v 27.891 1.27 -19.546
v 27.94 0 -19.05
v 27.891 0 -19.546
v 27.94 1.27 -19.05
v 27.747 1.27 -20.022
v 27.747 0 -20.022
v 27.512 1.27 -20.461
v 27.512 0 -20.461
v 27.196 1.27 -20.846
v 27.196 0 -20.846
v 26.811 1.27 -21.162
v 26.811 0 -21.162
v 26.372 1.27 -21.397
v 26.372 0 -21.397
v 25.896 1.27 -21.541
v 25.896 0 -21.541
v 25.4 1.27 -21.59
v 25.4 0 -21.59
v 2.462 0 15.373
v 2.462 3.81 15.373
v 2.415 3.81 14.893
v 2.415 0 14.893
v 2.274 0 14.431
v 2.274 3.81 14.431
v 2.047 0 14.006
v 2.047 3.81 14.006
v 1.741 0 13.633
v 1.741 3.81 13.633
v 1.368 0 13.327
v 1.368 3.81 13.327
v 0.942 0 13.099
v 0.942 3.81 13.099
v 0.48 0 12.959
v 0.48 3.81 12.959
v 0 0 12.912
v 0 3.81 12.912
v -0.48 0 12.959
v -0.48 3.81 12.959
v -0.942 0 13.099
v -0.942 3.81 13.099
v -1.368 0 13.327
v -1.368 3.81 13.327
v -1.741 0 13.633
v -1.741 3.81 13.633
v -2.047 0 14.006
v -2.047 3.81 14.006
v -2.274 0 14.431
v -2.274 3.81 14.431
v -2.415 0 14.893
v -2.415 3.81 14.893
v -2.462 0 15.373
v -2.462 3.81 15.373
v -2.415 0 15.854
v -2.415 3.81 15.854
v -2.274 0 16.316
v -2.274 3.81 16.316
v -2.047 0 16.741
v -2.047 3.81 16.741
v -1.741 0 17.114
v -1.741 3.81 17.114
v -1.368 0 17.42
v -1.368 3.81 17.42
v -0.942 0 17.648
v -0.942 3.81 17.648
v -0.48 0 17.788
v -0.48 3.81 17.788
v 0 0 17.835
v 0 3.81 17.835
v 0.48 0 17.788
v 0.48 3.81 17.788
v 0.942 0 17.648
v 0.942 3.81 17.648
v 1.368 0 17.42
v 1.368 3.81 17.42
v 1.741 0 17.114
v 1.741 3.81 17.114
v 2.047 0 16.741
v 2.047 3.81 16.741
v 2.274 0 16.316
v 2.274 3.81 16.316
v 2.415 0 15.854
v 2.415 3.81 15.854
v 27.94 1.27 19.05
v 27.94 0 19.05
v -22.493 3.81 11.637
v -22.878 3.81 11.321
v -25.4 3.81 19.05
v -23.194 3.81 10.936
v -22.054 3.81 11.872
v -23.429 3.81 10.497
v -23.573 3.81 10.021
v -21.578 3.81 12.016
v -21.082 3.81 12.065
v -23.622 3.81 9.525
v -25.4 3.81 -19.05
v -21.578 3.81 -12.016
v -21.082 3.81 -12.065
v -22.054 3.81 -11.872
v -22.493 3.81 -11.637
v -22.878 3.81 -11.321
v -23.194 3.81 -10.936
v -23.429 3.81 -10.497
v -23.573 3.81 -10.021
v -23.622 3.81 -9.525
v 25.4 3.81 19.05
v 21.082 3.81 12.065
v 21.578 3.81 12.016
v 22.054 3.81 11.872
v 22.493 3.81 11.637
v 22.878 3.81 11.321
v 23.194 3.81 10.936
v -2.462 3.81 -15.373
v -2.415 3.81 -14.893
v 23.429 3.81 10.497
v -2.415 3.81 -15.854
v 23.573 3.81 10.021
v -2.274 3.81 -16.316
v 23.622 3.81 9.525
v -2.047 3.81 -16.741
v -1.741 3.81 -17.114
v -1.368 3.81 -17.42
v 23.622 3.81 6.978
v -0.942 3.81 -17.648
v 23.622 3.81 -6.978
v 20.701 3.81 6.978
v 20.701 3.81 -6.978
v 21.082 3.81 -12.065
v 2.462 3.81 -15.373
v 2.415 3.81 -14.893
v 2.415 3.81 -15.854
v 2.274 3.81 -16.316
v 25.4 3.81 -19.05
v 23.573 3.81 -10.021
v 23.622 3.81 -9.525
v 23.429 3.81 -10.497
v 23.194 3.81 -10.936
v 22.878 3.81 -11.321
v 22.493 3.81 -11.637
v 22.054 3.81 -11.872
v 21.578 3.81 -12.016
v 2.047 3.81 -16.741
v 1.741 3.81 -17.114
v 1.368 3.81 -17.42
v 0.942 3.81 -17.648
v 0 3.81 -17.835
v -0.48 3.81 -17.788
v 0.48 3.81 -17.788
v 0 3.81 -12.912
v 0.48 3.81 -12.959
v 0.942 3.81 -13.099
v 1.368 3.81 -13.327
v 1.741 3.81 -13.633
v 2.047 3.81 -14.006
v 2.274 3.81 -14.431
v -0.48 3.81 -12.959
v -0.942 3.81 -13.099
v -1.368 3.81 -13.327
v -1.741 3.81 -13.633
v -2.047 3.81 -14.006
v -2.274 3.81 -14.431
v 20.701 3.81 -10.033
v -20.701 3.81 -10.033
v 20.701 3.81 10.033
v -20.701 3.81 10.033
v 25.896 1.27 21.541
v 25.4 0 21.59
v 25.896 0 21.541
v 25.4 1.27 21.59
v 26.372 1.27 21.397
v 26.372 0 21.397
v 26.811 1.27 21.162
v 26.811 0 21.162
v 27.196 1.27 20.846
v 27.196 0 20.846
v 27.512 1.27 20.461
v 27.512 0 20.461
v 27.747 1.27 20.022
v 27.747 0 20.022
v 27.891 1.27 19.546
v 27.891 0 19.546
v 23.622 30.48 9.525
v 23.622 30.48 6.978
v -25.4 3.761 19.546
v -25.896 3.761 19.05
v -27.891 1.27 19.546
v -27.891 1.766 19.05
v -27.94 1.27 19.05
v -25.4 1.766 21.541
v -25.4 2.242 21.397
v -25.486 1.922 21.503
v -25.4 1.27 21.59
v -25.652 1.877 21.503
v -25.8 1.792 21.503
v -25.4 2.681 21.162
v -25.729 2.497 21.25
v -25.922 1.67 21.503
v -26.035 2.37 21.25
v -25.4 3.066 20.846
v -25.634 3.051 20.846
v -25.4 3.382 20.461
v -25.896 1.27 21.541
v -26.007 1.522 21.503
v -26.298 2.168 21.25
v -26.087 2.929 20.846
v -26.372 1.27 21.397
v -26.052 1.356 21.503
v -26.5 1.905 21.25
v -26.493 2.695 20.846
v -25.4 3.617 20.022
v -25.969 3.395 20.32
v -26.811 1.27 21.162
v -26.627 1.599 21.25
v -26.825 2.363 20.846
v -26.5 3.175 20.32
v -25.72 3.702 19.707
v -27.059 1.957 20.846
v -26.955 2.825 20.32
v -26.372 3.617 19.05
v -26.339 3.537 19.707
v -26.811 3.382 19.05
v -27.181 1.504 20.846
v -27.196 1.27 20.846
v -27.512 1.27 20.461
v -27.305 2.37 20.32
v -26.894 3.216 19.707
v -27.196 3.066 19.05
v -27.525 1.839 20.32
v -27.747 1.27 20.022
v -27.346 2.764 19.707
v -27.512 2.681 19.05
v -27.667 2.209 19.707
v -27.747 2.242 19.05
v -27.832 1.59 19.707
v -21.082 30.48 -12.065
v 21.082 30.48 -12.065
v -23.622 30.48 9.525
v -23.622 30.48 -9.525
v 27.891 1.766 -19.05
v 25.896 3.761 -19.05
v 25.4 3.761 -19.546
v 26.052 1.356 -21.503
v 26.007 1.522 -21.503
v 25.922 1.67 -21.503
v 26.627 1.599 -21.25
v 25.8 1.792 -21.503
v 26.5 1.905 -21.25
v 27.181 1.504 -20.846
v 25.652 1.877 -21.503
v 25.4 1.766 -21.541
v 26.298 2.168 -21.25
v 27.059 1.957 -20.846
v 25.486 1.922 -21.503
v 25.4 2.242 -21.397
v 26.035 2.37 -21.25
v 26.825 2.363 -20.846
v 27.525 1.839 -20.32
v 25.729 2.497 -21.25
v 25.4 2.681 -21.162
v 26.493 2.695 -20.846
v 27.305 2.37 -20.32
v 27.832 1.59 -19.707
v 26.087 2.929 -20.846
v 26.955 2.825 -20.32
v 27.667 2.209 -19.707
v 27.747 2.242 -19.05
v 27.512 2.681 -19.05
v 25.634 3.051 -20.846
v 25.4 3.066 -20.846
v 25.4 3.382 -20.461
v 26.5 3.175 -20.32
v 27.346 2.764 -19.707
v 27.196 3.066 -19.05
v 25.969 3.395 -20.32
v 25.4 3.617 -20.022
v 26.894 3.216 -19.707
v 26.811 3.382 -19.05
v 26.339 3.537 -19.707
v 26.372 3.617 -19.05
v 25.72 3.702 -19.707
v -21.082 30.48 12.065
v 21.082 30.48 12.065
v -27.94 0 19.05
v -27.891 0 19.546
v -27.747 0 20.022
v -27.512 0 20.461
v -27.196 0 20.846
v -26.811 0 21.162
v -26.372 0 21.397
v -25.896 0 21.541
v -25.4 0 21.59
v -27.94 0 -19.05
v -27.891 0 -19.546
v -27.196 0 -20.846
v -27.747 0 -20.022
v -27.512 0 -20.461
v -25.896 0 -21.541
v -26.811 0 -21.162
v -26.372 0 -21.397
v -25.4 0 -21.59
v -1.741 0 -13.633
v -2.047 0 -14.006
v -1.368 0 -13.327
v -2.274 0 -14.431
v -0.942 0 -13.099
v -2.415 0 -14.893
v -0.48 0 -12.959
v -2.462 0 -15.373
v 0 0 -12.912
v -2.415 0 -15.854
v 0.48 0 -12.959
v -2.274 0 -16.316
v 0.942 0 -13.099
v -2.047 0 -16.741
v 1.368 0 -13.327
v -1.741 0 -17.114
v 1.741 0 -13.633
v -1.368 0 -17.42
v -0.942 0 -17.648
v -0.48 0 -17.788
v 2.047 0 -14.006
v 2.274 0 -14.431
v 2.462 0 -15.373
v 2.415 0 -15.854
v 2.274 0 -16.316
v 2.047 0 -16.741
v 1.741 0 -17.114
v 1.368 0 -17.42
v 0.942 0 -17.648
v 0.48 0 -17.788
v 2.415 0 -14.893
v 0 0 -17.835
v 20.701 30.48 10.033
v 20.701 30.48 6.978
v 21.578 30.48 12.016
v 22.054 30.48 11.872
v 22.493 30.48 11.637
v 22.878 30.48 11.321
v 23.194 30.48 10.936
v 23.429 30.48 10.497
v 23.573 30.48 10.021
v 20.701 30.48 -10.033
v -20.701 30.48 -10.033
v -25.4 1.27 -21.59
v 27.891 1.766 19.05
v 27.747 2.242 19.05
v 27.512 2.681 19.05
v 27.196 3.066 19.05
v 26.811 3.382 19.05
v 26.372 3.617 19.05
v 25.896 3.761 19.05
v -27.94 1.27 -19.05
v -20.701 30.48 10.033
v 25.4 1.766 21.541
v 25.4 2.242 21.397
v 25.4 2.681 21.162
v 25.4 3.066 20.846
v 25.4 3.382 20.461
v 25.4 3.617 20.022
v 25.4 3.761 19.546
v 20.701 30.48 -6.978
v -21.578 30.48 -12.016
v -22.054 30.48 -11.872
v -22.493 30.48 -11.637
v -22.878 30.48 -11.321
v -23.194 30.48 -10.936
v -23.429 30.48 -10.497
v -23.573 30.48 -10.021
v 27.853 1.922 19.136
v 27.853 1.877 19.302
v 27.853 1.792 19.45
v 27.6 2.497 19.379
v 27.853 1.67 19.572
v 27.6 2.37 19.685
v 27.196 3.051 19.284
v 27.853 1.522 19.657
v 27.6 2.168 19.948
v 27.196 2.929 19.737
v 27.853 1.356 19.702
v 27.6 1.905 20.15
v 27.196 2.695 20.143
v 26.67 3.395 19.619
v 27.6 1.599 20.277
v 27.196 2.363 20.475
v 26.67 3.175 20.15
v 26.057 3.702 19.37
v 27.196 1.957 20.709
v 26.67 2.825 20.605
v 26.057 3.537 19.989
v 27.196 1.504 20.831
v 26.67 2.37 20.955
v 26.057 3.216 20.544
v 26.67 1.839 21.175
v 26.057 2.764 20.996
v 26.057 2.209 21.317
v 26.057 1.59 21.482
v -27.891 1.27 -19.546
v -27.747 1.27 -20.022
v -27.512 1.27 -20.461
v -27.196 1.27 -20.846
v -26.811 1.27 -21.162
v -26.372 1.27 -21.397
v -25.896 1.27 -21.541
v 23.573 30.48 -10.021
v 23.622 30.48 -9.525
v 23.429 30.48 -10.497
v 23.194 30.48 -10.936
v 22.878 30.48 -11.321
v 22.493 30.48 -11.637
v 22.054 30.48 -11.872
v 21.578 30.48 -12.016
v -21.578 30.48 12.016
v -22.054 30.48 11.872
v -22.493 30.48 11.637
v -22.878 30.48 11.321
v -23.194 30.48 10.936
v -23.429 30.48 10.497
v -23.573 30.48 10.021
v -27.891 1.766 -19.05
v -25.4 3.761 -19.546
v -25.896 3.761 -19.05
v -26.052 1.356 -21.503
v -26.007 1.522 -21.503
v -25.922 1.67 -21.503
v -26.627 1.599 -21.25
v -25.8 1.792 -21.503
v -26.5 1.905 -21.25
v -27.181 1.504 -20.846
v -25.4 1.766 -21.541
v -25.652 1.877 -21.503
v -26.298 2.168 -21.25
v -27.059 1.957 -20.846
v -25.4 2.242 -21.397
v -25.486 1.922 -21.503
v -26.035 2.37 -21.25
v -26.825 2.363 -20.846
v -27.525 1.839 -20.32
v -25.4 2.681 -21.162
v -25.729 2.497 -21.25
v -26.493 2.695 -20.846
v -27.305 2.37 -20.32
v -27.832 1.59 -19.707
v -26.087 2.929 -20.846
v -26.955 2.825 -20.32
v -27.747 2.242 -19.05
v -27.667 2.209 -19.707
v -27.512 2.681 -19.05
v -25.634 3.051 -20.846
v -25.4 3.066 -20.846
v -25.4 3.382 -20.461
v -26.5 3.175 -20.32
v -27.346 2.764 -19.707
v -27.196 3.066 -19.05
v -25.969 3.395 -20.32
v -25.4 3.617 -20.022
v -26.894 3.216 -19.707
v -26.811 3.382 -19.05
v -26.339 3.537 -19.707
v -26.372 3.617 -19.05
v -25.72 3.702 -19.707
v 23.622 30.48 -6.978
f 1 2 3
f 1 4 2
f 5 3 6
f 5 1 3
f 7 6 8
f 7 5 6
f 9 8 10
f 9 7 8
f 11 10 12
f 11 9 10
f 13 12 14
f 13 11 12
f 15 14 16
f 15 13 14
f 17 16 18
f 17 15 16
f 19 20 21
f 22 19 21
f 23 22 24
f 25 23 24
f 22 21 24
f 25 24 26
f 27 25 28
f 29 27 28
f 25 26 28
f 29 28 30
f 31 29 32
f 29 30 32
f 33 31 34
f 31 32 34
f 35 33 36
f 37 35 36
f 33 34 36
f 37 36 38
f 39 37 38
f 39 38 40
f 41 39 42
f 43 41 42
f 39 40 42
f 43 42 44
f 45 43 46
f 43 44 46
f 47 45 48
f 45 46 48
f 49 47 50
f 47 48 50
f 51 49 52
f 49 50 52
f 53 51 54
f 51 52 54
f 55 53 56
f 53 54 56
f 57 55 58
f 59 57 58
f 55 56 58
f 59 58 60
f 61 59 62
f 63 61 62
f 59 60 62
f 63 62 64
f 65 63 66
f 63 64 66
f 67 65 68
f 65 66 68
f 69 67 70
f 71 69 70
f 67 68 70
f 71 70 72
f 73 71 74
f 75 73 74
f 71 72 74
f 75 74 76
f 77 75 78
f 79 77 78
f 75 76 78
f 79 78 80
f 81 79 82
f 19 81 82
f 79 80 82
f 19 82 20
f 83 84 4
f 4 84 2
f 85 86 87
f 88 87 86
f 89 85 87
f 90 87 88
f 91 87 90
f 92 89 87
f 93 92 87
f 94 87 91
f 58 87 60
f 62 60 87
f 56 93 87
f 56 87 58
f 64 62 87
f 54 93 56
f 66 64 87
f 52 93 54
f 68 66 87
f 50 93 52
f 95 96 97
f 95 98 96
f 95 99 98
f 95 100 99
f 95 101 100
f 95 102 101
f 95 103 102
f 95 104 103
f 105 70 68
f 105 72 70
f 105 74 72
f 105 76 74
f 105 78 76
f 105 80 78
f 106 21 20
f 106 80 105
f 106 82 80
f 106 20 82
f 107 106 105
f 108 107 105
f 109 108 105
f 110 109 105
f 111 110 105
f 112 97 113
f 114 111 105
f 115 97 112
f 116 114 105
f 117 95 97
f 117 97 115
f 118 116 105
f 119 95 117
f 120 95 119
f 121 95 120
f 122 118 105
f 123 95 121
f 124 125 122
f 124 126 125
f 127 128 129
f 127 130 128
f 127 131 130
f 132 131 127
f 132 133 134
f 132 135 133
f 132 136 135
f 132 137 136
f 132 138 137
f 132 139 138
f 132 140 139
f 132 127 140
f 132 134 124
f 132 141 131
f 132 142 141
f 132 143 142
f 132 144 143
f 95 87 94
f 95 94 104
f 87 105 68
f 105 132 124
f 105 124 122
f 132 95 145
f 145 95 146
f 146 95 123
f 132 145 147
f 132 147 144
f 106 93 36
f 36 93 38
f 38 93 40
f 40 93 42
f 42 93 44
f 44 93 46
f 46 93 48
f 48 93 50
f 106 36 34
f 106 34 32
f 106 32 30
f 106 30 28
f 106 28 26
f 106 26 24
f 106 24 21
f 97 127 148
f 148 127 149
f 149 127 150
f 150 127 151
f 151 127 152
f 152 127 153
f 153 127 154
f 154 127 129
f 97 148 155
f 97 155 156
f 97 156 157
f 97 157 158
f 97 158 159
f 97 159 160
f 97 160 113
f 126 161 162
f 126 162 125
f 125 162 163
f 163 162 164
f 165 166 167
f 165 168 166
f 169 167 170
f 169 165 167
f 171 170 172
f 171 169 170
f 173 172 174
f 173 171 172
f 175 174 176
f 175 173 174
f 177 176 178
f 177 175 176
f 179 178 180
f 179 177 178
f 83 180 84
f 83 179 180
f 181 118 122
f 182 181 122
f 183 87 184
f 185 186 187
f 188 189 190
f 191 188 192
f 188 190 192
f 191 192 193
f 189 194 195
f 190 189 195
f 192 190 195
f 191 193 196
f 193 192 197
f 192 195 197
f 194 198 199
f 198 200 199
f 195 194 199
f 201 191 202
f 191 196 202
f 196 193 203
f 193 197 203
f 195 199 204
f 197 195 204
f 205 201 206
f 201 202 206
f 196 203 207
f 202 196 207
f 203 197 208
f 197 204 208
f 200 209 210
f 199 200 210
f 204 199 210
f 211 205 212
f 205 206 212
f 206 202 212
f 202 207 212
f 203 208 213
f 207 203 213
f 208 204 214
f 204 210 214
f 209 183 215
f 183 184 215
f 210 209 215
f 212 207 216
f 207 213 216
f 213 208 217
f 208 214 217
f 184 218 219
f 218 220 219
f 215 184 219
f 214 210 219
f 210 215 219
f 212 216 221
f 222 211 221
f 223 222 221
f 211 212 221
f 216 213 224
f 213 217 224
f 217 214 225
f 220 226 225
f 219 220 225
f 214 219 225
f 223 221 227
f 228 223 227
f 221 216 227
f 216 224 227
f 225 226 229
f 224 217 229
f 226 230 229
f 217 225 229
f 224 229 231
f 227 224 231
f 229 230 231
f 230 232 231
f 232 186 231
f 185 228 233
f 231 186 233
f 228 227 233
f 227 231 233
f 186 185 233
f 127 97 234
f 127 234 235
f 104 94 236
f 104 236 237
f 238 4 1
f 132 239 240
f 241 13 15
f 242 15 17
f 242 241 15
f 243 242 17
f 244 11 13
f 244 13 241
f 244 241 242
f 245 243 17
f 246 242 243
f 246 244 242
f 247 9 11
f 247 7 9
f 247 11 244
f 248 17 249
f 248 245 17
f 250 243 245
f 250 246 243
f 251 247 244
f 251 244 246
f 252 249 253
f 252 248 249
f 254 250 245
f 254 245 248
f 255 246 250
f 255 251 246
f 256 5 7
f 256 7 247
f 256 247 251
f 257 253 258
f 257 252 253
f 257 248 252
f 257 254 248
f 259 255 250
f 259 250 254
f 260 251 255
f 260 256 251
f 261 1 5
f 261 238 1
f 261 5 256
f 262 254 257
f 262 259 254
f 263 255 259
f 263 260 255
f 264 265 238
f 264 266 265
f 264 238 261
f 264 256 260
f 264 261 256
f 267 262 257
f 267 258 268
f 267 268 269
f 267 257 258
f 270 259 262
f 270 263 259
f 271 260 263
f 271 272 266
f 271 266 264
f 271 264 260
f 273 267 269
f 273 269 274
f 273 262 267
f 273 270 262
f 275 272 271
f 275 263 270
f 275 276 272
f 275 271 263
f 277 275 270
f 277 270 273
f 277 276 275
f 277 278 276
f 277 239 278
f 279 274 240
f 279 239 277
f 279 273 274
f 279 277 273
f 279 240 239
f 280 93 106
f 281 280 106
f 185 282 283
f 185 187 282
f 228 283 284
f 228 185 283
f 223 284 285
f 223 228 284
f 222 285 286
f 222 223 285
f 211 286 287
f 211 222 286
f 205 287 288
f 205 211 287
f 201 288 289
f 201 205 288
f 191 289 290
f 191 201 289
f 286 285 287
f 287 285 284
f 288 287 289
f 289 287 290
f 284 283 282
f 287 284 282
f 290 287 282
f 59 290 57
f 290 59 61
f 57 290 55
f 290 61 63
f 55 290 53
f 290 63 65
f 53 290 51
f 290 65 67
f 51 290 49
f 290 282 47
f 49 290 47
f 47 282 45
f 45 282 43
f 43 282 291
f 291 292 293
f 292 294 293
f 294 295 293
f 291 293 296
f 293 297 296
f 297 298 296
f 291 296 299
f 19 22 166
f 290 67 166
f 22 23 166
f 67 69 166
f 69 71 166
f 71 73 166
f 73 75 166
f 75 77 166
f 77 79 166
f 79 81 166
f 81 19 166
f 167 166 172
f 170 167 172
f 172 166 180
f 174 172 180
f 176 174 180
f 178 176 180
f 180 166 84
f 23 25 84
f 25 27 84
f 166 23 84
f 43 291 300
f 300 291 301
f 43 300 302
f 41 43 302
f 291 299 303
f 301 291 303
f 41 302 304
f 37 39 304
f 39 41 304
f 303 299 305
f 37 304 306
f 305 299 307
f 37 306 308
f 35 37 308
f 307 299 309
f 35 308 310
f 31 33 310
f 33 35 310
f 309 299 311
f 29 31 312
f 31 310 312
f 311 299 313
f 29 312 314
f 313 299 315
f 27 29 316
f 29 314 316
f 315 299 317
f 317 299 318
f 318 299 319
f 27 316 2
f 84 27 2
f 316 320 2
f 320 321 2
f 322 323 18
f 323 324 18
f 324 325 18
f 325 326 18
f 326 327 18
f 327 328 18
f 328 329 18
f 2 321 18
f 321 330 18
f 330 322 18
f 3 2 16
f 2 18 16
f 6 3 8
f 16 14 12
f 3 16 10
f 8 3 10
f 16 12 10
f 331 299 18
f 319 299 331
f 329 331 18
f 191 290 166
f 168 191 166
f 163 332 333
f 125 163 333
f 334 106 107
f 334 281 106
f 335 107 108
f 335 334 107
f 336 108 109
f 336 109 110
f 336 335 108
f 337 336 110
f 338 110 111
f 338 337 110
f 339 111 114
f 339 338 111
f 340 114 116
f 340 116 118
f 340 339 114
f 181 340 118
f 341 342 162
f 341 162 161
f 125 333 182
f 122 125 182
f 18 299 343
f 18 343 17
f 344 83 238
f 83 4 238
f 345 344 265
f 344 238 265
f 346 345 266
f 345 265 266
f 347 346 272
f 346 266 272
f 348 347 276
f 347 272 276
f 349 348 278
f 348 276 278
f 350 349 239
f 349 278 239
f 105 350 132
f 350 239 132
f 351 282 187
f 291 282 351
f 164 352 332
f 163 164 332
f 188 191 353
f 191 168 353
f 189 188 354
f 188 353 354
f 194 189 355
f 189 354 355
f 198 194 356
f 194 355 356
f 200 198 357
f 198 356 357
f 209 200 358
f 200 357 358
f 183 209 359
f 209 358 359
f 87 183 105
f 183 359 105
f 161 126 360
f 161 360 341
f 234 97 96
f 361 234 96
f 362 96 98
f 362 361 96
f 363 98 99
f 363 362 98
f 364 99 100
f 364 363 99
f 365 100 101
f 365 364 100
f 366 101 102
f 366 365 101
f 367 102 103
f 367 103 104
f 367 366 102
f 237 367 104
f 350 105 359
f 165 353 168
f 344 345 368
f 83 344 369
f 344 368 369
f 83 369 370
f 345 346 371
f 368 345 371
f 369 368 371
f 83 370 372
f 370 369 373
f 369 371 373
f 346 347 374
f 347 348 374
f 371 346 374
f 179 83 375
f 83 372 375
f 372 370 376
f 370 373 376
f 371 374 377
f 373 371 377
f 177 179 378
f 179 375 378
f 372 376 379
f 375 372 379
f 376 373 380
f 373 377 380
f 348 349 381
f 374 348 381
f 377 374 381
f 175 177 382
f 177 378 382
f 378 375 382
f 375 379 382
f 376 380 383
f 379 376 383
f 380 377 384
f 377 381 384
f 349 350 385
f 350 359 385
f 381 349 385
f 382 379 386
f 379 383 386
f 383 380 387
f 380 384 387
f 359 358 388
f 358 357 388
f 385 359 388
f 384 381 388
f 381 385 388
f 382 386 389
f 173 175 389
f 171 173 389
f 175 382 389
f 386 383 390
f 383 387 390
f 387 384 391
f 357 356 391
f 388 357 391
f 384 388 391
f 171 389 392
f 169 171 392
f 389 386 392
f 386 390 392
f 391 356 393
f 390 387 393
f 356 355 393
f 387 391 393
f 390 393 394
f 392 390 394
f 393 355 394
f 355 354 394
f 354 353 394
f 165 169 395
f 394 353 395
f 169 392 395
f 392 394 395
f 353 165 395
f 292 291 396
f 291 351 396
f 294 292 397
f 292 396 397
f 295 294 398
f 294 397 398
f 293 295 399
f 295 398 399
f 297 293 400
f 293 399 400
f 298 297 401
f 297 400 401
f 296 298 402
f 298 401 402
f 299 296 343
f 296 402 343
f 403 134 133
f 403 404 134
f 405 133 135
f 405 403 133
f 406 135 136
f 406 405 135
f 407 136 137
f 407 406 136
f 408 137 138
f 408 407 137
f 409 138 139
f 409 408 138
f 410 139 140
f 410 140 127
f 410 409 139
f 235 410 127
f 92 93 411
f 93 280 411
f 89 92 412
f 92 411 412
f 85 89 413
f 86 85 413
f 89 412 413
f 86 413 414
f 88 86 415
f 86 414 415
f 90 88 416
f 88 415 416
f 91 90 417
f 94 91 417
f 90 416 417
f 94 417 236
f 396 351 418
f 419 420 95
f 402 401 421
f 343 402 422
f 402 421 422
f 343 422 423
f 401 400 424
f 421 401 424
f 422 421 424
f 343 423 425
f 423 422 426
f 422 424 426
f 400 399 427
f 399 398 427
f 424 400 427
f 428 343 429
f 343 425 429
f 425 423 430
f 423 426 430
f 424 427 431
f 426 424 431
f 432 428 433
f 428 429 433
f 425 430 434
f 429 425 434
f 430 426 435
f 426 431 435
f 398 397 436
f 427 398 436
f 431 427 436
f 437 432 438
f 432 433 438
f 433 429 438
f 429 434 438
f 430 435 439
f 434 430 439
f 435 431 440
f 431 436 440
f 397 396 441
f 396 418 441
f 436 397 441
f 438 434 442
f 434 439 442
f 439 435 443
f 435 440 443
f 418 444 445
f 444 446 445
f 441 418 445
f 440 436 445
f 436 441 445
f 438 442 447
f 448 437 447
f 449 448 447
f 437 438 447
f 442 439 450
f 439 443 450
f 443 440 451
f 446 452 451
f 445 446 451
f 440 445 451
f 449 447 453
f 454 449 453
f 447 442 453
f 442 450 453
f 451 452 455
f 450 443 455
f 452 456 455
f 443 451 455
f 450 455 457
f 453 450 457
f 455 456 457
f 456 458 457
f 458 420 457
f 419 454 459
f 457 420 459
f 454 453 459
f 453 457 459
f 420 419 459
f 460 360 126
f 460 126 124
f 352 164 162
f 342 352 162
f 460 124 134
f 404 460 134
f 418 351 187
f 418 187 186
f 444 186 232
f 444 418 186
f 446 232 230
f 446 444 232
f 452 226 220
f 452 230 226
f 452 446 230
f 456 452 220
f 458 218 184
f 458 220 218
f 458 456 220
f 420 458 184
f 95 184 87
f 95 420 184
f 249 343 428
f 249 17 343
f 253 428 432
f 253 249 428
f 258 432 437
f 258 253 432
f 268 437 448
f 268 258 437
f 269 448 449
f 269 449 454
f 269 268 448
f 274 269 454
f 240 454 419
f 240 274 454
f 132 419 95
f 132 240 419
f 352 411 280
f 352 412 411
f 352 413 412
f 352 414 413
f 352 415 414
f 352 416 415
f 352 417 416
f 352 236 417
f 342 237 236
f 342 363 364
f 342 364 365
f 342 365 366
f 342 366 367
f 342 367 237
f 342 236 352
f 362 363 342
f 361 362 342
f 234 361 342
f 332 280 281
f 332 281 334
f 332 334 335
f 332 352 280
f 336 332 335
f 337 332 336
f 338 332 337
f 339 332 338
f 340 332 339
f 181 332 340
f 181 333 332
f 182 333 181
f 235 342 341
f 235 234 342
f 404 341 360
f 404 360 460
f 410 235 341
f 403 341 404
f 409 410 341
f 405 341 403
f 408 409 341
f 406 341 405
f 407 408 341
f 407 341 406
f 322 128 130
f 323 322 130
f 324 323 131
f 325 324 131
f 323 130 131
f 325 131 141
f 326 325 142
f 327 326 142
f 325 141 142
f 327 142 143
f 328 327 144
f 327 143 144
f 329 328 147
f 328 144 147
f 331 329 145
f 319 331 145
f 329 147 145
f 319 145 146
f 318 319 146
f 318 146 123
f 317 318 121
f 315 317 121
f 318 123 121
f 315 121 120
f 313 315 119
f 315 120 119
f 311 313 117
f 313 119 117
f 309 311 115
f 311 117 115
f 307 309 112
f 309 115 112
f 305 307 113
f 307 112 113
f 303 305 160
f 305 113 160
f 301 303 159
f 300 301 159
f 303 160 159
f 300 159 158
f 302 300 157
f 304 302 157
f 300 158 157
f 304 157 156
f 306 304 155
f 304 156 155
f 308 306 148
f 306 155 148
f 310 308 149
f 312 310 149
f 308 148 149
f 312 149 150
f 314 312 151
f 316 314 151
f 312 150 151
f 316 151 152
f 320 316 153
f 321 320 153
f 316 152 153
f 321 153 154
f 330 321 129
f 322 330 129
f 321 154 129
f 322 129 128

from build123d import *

# Parameters (mm, degrees)
SKETCH1_W           = 55.88
SKETCH1_H           = 43.18
BOSS_EXTRUDE1_DEPTH = 3.81
FILLET1_R           = 2.54
SKETCH3_W           = 47.244
SKETCH3_H           = 24.13
BOSS_EXTRUDE2_DEPTH = 26.67
FILLET2_R           = 2.54
SKETCH6_W           = 41.402
SKETCH6_H           = 20.066
CUT_EXTRUDE1_DEPTH  = 26.67
SKETCH7_R           = 2.461857572
CUT_EXTRUDE2_DEPTH  = 3.81
SKETCH9_W           = 3.778787448
SKETCH9_H           = 13.955771
CUT_EXTRUDE4_DEPTH  = 26.67


with BuildPart() as part:
    # Sketch1 → Boss-Extrude1 (new body)
    with BuildSketch(Plane(origin=(0, 0, 0), x_dir=(1, 0, 0), z_dir=(0, 1, 0))):
        Rectangle(SKETCH1_W, SKETCH1_H)
    extrude(amount=BOSS_EXTRUDE1_DEPTH)

    # Fillet1
    fillet1_edges = [part.edges().sort_by_distance(p)[0] for p in [
        (-27.94, 3.81, 0),
        (0, 3.81, 21.59),
        (27.94, 3.81, 0),
        (27.94, 1.905, 21.59),
        (-27.94, 1.905, 21.59),
        (-27.94, 1.905, -21.59),
        (27.94, 1.905, -21.59),
        (0, 3.81, -21.59),
    ]]
    fillet(fillet1_edges, radius=FILLET1_R)

    # Sketch3 → Boss-Extrude2 (add)
    with BuildSketch(Plane(origin=(0, 3.81, 0), x_dir=(1, 0, 0), z_dir=(0, 1, 0))):
        Rectangle(SKETCH3_W, SKETCH3_H)
    extrude(amount=BOSS_EXTRUDE2_DEPTH)

    # Fillet2
    fillet2_edges = [part.edges().sort_by_distance(p)[0] for p in [
        (23.622, 17.145, 12.065),
        (23.622, 17.145, -12.065),
        (-23.622, 17.145, -12.065),
        (-23.622, 17.145, 12.065),
    ]]
    fillet(fillet2_edges, radius=FILLET2_R)

    # Sketch6 → Cut-Extrude1 (cut)
    with BuildSketch(Plane(origin=(0, 30.48, 0), x_dir=(1, 0, 0), z_dir=(0, 1, 0))):
        Rectangle(SKETCH6_W, SKETCH6_H)
    extrude(amount=-CUT_EXTRUDE1_DEPTH, mode=Mode.SUBTRACT)

    # Sketch7 → Cut-Extrude2 (cut)
    with BuildSketch(Plane(origin=(0, 3.81, 0), x_dir=(1, 0, 0), z_dir=(0, 1, 0))):
        with Locations((0, 15.373463193)):
            Circle(SKETCH7_R)
        with Locations((0, -15.373463193)):
            Circle(SKETCH7_R)
    extrude(amount=-CUT_EXTRUDE2_DEPTH, mode=Mode.SUBTRACT)

    # Sketch9 → Cut-Extrude4 (cut)
    with BuildSketch(Plane(origin=(0, 30.48, 0), x_dir=(1, 0, 0), z_dir=(0, 1, 0))):
        with Locations((21.732606276, 0)):
            Rectangle(SKETCH9_W, SKETCH9_H)
    extrude(amount=-CUT_EXTRUDE4_DEPTH, mode=Mode.SUBTRACT)


solid = part.part
